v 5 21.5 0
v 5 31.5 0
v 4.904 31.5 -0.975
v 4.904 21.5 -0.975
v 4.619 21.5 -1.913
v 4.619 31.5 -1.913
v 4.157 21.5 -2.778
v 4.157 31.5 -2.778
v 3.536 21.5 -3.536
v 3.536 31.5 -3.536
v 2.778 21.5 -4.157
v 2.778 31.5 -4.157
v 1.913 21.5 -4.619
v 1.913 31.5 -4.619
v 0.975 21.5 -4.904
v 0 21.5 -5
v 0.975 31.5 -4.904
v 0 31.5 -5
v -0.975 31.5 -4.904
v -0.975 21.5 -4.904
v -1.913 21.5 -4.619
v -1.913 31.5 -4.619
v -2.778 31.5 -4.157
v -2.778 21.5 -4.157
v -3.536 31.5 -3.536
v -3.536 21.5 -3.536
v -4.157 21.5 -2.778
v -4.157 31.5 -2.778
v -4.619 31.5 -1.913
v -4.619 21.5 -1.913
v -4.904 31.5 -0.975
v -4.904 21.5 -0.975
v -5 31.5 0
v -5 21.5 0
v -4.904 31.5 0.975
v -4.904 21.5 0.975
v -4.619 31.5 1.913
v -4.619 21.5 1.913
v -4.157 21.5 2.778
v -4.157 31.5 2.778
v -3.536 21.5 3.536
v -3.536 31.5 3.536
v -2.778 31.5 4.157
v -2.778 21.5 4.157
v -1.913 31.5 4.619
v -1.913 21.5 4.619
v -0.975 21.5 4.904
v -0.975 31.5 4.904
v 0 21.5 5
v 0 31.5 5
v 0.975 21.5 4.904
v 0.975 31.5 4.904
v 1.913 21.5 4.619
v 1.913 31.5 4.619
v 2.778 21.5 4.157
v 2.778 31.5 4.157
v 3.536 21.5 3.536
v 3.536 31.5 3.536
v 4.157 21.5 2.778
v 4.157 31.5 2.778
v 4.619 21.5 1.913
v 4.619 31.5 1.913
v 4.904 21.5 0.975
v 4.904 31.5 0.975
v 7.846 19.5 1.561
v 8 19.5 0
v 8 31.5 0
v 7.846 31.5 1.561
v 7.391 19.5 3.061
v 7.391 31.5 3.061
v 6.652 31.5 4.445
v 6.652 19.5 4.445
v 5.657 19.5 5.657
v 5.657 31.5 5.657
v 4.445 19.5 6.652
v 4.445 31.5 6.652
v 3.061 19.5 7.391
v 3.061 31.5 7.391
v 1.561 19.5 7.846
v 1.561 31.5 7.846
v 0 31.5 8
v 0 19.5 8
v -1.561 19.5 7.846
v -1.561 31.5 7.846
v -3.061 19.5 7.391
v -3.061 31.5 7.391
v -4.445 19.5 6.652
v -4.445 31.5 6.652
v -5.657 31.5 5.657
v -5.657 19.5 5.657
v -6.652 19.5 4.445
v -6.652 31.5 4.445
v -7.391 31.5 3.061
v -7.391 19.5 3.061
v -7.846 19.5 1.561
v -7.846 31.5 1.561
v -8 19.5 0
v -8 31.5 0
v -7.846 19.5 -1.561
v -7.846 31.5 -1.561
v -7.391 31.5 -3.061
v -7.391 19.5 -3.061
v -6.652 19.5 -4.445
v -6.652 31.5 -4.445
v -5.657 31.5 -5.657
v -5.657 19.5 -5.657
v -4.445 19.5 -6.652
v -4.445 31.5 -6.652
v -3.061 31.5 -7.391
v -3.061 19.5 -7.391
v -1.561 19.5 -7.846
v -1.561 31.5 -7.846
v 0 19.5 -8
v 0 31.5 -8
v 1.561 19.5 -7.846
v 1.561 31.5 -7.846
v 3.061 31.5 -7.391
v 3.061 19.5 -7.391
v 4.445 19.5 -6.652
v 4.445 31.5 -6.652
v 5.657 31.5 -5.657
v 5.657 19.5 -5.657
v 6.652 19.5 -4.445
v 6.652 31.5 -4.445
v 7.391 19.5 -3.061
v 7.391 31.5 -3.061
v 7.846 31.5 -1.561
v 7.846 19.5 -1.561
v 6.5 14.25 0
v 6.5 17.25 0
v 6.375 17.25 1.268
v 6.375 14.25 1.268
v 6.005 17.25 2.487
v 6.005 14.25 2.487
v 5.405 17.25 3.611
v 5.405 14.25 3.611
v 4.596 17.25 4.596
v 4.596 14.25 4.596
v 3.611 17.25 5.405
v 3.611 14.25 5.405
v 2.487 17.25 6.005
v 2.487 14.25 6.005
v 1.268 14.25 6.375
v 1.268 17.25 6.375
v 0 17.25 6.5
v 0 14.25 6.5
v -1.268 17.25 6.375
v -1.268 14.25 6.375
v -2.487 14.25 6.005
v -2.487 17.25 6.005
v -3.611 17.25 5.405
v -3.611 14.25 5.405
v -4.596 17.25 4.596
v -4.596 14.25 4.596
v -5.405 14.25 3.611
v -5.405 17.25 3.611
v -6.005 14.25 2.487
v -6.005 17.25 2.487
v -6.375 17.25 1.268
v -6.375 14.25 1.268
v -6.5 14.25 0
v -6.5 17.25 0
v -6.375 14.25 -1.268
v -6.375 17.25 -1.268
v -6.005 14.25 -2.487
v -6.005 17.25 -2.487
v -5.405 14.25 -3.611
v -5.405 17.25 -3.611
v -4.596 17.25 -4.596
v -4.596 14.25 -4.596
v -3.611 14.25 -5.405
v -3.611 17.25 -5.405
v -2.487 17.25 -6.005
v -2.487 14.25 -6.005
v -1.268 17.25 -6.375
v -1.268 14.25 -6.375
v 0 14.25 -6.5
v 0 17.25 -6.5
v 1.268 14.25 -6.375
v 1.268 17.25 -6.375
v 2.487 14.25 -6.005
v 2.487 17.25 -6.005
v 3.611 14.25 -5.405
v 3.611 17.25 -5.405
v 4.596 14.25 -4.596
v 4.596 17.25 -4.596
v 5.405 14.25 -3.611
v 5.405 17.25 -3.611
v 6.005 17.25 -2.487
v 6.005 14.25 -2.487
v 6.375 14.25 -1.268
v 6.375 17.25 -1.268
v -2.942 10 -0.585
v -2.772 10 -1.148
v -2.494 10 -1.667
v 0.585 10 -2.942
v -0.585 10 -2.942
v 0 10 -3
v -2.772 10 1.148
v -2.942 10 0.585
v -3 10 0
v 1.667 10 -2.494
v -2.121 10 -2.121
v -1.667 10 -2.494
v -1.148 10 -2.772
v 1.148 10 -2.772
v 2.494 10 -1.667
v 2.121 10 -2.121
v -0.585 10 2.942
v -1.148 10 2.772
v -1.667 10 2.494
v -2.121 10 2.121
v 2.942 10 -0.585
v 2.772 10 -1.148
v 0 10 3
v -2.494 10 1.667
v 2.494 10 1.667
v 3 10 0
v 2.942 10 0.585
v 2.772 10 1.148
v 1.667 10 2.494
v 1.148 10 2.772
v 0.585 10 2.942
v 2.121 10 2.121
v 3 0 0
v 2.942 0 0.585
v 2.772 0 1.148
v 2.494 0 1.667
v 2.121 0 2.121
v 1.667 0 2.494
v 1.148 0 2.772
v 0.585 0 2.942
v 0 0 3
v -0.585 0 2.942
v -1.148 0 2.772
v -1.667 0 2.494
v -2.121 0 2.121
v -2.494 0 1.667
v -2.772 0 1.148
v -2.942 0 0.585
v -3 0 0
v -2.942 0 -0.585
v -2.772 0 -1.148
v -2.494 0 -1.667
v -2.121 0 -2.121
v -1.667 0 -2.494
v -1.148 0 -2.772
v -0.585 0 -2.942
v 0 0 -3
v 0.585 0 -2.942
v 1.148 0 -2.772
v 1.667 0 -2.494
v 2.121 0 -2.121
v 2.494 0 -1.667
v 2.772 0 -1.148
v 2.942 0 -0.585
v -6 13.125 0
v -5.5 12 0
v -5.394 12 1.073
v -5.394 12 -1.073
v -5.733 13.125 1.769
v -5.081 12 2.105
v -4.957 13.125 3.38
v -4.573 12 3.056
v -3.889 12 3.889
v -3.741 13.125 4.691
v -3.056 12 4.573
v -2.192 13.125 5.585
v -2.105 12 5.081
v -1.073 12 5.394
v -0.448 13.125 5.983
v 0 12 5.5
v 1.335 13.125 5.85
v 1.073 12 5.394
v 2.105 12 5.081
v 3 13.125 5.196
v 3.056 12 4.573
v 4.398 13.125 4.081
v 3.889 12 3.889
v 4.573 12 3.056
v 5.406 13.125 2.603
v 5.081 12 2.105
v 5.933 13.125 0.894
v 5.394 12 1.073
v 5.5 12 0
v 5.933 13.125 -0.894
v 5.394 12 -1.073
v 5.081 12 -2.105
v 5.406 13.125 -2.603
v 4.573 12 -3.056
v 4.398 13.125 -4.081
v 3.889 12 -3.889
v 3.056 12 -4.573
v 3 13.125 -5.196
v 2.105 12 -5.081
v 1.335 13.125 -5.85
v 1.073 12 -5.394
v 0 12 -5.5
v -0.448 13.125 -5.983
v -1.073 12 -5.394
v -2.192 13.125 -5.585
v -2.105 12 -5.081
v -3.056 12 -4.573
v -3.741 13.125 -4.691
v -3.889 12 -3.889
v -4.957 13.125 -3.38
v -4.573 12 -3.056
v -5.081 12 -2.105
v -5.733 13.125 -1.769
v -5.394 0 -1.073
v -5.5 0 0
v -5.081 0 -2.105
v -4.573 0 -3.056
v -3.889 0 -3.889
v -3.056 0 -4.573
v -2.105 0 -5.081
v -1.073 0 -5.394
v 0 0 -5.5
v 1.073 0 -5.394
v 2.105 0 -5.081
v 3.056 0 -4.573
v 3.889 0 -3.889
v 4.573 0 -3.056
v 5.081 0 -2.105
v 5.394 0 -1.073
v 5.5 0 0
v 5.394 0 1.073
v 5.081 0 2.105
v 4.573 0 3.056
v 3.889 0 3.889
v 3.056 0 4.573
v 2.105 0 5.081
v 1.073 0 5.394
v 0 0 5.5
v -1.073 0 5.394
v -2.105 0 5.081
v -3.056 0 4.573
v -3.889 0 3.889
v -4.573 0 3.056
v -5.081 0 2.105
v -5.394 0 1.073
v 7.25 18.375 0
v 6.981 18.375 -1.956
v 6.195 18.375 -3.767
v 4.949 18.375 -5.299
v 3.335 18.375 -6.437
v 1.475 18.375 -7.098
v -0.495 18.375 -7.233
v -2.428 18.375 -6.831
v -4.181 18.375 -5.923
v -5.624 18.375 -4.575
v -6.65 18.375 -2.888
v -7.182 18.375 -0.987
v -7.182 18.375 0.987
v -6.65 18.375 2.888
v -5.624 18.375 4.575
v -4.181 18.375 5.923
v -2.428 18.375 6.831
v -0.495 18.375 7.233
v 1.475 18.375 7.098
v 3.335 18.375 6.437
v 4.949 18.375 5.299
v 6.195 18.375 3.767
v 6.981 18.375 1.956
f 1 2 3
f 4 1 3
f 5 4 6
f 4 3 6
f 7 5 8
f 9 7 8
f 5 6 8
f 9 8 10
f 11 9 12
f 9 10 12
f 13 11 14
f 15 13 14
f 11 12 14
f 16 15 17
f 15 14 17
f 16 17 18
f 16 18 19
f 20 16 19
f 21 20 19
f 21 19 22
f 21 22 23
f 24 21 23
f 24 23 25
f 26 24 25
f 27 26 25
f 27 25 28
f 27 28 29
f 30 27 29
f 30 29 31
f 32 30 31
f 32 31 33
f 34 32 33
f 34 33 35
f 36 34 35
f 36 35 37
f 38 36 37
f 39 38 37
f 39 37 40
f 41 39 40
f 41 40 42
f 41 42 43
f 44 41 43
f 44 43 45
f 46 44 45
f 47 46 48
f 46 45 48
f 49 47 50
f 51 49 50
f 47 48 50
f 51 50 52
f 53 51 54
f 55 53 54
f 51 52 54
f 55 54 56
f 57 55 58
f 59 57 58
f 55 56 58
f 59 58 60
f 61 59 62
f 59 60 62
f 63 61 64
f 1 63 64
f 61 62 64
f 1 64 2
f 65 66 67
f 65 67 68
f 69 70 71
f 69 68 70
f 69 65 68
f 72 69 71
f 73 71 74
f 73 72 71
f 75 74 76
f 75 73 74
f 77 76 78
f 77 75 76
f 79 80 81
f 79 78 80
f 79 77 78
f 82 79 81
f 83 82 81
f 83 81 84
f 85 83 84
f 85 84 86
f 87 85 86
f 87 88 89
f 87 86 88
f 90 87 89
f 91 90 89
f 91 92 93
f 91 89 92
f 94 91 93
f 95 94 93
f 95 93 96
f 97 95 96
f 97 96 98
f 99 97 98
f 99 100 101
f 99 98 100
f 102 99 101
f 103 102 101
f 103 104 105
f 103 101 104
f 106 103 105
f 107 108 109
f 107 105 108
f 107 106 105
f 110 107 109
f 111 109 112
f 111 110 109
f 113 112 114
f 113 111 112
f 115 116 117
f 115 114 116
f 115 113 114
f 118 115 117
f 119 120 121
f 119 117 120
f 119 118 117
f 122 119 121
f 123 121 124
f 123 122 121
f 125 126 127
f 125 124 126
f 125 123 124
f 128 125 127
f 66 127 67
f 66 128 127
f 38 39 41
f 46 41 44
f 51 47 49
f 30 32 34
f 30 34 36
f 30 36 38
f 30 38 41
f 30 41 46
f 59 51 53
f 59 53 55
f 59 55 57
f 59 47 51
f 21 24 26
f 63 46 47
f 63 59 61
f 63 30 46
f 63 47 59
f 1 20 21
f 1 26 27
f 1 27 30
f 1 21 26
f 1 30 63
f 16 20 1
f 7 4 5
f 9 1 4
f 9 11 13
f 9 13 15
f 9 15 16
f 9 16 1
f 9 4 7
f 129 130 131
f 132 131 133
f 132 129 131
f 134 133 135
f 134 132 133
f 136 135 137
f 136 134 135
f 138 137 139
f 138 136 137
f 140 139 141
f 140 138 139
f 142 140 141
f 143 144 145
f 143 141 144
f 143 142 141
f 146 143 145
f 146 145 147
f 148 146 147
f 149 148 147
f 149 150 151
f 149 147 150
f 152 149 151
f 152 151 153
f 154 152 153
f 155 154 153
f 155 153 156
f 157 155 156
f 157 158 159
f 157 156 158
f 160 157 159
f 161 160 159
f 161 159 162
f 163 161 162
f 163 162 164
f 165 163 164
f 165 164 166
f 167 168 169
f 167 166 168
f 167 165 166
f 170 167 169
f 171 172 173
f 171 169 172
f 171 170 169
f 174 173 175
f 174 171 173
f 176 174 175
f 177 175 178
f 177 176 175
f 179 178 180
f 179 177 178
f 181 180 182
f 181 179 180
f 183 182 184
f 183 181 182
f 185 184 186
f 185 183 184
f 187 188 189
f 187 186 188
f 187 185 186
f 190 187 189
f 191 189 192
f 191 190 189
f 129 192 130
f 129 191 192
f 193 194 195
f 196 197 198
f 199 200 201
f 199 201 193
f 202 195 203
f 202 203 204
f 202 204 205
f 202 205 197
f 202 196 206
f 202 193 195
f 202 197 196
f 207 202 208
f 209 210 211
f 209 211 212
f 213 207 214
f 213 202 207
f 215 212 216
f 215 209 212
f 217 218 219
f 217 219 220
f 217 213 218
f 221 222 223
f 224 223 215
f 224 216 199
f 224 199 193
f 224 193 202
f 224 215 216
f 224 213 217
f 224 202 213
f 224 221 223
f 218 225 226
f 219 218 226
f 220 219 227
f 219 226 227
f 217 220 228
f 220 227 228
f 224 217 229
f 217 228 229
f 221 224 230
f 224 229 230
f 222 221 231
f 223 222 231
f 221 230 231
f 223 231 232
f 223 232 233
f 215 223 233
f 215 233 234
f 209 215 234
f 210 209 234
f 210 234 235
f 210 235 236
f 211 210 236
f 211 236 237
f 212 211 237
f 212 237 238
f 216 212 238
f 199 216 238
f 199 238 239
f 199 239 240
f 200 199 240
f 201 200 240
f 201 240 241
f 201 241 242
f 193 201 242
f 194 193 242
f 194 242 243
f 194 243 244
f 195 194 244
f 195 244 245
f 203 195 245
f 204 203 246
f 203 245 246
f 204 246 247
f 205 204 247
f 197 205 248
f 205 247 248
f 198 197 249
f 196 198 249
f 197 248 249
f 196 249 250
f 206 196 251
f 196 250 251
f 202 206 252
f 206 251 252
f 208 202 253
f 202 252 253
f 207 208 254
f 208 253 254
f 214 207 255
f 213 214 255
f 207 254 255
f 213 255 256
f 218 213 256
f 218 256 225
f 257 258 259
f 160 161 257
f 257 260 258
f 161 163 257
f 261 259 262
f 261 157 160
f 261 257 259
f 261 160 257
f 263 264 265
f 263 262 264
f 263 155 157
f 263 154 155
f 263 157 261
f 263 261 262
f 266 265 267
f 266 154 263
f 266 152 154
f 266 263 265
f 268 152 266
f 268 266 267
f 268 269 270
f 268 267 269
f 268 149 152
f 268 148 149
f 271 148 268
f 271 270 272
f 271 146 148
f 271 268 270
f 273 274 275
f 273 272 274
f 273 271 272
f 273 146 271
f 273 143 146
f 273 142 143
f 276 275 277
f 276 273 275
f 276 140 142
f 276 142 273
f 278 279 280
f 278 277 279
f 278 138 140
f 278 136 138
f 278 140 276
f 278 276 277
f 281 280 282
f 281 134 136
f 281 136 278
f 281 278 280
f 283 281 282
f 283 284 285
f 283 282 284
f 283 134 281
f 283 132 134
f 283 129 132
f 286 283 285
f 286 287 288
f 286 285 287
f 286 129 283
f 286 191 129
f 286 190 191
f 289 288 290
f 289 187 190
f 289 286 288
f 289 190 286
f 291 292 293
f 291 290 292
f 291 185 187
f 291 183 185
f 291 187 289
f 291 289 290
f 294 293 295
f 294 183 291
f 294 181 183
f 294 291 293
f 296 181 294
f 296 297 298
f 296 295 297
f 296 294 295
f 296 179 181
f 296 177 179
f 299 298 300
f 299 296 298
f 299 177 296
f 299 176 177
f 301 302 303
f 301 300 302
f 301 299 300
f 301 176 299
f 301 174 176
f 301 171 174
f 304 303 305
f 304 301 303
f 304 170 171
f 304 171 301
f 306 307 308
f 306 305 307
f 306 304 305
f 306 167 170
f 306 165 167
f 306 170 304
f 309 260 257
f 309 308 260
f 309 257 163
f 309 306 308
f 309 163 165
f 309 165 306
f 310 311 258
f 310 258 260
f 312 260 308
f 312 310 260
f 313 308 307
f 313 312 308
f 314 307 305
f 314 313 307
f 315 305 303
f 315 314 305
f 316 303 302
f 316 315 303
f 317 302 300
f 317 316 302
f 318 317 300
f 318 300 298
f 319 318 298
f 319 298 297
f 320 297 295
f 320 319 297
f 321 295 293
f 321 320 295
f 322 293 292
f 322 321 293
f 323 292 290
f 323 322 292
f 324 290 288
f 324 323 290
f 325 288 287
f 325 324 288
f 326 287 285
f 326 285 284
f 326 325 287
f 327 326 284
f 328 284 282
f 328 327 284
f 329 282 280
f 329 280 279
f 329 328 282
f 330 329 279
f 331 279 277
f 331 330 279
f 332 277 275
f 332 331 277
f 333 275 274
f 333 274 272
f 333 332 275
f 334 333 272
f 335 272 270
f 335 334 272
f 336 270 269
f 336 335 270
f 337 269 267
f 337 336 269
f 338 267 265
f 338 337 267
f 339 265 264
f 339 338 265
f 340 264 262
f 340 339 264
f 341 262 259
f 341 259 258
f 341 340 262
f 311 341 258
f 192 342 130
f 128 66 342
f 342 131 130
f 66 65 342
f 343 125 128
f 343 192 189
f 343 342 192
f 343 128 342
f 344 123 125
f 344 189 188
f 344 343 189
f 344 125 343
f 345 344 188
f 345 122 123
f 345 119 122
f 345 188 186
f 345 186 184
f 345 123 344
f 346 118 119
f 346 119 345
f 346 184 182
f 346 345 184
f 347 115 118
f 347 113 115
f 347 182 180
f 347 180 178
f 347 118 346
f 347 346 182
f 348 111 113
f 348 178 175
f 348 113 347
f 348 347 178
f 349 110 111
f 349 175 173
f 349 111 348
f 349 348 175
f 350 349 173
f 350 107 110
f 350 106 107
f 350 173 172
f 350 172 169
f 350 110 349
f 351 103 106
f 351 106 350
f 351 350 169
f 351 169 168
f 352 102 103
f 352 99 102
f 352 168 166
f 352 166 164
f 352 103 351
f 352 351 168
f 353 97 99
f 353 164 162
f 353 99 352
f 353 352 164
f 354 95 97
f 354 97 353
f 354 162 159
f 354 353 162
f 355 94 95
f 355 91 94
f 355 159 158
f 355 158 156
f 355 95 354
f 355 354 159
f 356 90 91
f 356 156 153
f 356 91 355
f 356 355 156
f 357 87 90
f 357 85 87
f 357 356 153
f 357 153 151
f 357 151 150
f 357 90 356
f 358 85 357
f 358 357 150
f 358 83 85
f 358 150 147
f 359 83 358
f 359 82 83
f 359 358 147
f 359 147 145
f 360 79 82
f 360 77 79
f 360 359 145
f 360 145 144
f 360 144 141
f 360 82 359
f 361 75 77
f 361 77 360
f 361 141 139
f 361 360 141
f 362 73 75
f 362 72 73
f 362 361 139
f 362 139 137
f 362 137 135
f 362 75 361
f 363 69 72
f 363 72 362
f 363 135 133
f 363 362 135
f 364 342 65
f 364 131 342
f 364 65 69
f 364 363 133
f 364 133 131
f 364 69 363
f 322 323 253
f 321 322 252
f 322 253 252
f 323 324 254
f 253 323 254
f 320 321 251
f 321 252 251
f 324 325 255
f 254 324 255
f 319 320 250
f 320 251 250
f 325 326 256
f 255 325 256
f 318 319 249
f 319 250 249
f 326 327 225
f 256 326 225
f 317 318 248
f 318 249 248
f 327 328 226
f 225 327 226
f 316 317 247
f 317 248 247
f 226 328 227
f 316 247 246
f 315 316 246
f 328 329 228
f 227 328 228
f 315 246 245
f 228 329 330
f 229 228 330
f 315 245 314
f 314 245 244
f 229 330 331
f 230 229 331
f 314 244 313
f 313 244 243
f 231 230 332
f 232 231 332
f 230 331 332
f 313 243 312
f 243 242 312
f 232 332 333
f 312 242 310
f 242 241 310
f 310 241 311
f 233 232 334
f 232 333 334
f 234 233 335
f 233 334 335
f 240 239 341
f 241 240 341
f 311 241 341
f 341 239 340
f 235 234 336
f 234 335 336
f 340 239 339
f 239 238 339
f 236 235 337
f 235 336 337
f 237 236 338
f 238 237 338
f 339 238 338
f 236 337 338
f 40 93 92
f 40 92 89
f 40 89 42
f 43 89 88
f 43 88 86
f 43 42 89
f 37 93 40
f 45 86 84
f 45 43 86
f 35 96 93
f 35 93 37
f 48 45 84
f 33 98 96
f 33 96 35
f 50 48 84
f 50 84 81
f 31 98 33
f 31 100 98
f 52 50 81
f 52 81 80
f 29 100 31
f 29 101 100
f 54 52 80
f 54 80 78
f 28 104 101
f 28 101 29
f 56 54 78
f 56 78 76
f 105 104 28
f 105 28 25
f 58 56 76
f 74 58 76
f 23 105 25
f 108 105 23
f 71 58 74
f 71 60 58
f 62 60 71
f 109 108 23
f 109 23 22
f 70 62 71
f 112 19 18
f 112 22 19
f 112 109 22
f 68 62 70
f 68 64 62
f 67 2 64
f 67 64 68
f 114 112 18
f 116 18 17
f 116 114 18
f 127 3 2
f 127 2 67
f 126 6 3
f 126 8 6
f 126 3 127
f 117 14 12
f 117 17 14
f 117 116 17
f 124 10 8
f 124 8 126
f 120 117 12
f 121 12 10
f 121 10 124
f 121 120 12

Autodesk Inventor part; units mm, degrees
ref_plane "YZ Plane" through (0, 0, 0) normal (1, 0, 0) x (0, 1, 0)
sketch "Sketch1" plane through (0, 0, 0) normal (0, 1, 0) x (-1, 0, 0)
  circle A0 centre (0, 0) radius 5.5
  dimension "d0" = 11
extrude "Extrusion1" add sketch "Sketch1" along normal blind 12
sketch "Sketch2" plane through (0, 0, 0) normal (0, -1, 0) x (1, 0, 0)
  circle A0 centre (0, 0) radius 3
  dimension "d3" = 6
extrude "Extrusion2" cut sketch "Sketch2" against normal blind 10
ref_plane "Work Plane1" through (0, 14.25, 0) normal (0, 1, 0) x (1, 0, 0)
sketch "Sketch3" plane through (0, 14.25, 0) normal (0, 1, 0) x (1, 0, 0)
  circle A0 centre (0, 0) radius 5.5 projected
  circle A1 centre (0, 0) radius 6.5
  dimension "d7" = 13
extrude "Extrusion3" add sketch "Sketch3" along normal blind 3 contours A0 | A1
loft "Loft1" add section 1 edges at (5.5, 12, 0) section 2 edges at (-6.5, 14.25, 0)
ref_plane "Work Plane2" through (0, 19.5, 0) normal (0, 1, 0) x (1, 0, 0)
sketch "Sketch4" plane through (0, 19.5, 0) normal (0, 1, 0) x (1, 0, 0)
  circle A0 centre (0, 0) radius 3 projected
  circle A1 centre (0, 0) radius 8
  dimension "d15" = 16
extrude "Extrusion4" add sketch "Sketch4" along normal blind 12 contours A0 | A1
loft "Loft2" add section 1 edges at (-6.5, 17.25, 0) section 2 edges at (-8, 19.5, 0)
sketch "Sketch5" plane through (0, 31.5, 0) normal (0, 1, 0) x (1, 0, 0)
  circle A0 centre (0, 0) radius 8 projected
  circle A1 centre (0, 0) radius 5
  dimension "d22" = 10
extrude "Extrusion5" cut sketch "Sketch5" against normal blind 10 contours A1
properties part number "reductor_10_6"
